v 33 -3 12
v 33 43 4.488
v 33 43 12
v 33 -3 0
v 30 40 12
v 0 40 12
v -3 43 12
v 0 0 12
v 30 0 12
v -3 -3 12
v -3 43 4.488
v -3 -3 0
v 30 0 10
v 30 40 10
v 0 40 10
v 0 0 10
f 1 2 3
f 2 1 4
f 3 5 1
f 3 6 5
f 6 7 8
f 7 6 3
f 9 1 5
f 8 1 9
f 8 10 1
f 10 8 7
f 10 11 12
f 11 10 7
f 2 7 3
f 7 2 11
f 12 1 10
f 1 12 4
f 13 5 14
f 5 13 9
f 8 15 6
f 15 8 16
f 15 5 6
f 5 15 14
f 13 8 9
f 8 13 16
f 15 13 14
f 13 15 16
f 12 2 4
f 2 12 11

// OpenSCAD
/** Create Wedge **/
/*      
Universal Adjustabel Wedge by Chris Schaefer is licensed under the Creative Commons - Attribution - Non-Commercial license. 
*/

// MB Interface

/* [Slope] */
// from leg to leg
Slope_Length=120;
// how high is the gap? equals the wedge hight
Gap_Height=10;

/* [Wedge Size] */
// how wide is the wedge? along the gap
Wedge_X=30;
// length of the wedge, along the slope
Wedge_Y=40;

// Should the wedge have edges to prevent rolling off?
/* [Edge] */
// the width will be added around the wedge
Edge_Width=3.0;
// the hight will be added to the gap size.
Edge_Height=2.0;


// Interface End
/* [Hidden] */
// Length
LEN=Slope_Length; 
// Gap 
GAP=Gap_Height;

// Block size
/* [Block Size] */
// width (width at the max hight)
X=Wedge_X;
// length (length along the slope)      
Y=Wedge_Y;

// edge around the block to stop rolling off
EDGE=Edge_Width;    // edge border thickness
EDGE_H=Edge_Height;  // hight of the edge

// ========================================================
// Block is:
module block () {
    // Block size
    cube(size = [ X, Y, GAP ], center = false);
    // Edge added
    translate([-EDGE, -EDGE, 0])
        difference ()
          {
            cube(size = [ X+2*EDGE, Y+2*EDGE, GAP+EDGE_H ], center = false);
            translate ([EDGE, EDGE,0])
              cube(size = [ X, Y, GAP+EDGE_H ], center = false);
          }
      }


 
 
module wedge () {
    // Wedge with the right slop
        // shift and rotate it into place
            translate ( [-EDGE,-0,GAP] )
            rotate ([0,90,0])
        // wedge
        linear_extrude(height = X+2*EDGE)
         polygon( points=[[-EDGE_H,-EDGE],[-EDGE_H,LEN],[GAP,-EDGE]]  );
    
 }
 
// limit the block to the wedge, gives it the right slope.
intersection () 
 {
      block ();
      wedge ();
  }
  
